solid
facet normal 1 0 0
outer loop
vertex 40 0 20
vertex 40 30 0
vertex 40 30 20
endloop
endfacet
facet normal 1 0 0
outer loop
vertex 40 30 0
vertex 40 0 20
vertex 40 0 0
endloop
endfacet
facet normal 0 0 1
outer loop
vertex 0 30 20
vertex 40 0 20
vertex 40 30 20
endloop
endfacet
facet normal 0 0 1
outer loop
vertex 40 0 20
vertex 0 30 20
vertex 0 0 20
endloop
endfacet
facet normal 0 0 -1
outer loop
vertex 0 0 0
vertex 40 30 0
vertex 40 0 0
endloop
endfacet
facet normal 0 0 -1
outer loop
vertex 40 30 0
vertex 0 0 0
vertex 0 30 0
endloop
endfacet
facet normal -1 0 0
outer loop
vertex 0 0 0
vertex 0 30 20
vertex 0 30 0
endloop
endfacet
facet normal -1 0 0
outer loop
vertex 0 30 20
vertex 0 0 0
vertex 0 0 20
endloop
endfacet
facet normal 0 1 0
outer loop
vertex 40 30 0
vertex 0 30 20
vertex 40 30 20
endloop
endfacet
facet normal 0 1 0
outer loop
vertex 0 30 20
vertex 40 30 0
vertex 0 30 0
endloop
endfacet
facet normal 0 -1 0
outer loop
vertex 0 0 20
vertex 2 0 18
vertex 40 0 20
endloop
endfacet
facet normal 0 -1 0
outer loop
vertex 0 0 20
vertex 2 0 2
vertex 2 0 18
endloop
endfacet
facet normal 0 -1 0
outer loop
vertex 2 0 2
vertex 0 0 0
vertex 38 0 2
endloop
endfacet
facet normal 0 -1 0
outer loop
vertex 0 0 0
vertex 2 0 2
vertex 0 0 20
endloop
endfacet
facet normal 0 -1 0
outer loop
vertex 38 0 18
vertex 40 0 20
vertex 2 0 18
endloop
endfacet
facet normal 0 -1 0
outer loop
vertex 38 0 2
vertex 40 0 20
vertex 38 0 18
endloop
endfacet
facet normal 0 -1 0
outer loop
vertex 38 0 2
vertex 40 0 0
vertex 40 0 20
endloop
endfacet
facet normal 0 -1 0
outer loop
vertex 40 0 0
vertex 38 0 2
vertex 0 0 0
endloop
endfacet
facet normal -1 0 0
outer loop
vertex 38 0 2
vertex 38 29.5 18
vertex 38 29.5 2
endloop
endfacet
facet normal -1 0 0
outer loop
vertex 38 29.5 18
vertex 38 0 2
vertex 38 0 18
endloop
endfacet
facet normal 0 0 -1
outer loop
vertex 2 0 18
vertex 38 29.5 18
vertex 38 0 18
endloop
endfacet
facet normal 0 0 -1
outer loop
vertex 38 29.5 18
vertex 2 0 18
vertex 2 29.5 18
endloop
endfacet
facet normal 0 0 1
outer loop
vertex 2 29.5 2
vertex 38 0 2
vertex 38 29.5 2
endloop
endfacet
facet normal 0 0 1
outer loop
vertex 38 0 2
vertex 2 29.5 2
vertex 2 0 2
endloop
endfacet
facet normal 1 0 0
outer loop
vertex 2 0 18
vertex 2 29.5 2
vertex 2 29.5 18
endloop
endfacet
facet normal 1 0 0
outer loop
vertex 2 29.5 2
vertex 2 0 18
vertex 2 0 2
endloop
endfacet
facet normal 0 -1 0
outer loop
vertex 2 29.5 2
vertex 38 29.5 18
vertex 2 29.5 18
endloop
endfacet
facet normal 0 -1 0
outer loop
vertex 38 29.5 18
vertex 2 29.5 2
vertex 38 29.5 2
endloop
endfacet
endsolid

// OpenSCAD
// units=mm — generated by scad_emitter.py
// part=unnamed
$fn = 48;

difference() { cube([40, 30, 20]); translate([2, -0.5, 2]) cube([36, 30, 16]); }
